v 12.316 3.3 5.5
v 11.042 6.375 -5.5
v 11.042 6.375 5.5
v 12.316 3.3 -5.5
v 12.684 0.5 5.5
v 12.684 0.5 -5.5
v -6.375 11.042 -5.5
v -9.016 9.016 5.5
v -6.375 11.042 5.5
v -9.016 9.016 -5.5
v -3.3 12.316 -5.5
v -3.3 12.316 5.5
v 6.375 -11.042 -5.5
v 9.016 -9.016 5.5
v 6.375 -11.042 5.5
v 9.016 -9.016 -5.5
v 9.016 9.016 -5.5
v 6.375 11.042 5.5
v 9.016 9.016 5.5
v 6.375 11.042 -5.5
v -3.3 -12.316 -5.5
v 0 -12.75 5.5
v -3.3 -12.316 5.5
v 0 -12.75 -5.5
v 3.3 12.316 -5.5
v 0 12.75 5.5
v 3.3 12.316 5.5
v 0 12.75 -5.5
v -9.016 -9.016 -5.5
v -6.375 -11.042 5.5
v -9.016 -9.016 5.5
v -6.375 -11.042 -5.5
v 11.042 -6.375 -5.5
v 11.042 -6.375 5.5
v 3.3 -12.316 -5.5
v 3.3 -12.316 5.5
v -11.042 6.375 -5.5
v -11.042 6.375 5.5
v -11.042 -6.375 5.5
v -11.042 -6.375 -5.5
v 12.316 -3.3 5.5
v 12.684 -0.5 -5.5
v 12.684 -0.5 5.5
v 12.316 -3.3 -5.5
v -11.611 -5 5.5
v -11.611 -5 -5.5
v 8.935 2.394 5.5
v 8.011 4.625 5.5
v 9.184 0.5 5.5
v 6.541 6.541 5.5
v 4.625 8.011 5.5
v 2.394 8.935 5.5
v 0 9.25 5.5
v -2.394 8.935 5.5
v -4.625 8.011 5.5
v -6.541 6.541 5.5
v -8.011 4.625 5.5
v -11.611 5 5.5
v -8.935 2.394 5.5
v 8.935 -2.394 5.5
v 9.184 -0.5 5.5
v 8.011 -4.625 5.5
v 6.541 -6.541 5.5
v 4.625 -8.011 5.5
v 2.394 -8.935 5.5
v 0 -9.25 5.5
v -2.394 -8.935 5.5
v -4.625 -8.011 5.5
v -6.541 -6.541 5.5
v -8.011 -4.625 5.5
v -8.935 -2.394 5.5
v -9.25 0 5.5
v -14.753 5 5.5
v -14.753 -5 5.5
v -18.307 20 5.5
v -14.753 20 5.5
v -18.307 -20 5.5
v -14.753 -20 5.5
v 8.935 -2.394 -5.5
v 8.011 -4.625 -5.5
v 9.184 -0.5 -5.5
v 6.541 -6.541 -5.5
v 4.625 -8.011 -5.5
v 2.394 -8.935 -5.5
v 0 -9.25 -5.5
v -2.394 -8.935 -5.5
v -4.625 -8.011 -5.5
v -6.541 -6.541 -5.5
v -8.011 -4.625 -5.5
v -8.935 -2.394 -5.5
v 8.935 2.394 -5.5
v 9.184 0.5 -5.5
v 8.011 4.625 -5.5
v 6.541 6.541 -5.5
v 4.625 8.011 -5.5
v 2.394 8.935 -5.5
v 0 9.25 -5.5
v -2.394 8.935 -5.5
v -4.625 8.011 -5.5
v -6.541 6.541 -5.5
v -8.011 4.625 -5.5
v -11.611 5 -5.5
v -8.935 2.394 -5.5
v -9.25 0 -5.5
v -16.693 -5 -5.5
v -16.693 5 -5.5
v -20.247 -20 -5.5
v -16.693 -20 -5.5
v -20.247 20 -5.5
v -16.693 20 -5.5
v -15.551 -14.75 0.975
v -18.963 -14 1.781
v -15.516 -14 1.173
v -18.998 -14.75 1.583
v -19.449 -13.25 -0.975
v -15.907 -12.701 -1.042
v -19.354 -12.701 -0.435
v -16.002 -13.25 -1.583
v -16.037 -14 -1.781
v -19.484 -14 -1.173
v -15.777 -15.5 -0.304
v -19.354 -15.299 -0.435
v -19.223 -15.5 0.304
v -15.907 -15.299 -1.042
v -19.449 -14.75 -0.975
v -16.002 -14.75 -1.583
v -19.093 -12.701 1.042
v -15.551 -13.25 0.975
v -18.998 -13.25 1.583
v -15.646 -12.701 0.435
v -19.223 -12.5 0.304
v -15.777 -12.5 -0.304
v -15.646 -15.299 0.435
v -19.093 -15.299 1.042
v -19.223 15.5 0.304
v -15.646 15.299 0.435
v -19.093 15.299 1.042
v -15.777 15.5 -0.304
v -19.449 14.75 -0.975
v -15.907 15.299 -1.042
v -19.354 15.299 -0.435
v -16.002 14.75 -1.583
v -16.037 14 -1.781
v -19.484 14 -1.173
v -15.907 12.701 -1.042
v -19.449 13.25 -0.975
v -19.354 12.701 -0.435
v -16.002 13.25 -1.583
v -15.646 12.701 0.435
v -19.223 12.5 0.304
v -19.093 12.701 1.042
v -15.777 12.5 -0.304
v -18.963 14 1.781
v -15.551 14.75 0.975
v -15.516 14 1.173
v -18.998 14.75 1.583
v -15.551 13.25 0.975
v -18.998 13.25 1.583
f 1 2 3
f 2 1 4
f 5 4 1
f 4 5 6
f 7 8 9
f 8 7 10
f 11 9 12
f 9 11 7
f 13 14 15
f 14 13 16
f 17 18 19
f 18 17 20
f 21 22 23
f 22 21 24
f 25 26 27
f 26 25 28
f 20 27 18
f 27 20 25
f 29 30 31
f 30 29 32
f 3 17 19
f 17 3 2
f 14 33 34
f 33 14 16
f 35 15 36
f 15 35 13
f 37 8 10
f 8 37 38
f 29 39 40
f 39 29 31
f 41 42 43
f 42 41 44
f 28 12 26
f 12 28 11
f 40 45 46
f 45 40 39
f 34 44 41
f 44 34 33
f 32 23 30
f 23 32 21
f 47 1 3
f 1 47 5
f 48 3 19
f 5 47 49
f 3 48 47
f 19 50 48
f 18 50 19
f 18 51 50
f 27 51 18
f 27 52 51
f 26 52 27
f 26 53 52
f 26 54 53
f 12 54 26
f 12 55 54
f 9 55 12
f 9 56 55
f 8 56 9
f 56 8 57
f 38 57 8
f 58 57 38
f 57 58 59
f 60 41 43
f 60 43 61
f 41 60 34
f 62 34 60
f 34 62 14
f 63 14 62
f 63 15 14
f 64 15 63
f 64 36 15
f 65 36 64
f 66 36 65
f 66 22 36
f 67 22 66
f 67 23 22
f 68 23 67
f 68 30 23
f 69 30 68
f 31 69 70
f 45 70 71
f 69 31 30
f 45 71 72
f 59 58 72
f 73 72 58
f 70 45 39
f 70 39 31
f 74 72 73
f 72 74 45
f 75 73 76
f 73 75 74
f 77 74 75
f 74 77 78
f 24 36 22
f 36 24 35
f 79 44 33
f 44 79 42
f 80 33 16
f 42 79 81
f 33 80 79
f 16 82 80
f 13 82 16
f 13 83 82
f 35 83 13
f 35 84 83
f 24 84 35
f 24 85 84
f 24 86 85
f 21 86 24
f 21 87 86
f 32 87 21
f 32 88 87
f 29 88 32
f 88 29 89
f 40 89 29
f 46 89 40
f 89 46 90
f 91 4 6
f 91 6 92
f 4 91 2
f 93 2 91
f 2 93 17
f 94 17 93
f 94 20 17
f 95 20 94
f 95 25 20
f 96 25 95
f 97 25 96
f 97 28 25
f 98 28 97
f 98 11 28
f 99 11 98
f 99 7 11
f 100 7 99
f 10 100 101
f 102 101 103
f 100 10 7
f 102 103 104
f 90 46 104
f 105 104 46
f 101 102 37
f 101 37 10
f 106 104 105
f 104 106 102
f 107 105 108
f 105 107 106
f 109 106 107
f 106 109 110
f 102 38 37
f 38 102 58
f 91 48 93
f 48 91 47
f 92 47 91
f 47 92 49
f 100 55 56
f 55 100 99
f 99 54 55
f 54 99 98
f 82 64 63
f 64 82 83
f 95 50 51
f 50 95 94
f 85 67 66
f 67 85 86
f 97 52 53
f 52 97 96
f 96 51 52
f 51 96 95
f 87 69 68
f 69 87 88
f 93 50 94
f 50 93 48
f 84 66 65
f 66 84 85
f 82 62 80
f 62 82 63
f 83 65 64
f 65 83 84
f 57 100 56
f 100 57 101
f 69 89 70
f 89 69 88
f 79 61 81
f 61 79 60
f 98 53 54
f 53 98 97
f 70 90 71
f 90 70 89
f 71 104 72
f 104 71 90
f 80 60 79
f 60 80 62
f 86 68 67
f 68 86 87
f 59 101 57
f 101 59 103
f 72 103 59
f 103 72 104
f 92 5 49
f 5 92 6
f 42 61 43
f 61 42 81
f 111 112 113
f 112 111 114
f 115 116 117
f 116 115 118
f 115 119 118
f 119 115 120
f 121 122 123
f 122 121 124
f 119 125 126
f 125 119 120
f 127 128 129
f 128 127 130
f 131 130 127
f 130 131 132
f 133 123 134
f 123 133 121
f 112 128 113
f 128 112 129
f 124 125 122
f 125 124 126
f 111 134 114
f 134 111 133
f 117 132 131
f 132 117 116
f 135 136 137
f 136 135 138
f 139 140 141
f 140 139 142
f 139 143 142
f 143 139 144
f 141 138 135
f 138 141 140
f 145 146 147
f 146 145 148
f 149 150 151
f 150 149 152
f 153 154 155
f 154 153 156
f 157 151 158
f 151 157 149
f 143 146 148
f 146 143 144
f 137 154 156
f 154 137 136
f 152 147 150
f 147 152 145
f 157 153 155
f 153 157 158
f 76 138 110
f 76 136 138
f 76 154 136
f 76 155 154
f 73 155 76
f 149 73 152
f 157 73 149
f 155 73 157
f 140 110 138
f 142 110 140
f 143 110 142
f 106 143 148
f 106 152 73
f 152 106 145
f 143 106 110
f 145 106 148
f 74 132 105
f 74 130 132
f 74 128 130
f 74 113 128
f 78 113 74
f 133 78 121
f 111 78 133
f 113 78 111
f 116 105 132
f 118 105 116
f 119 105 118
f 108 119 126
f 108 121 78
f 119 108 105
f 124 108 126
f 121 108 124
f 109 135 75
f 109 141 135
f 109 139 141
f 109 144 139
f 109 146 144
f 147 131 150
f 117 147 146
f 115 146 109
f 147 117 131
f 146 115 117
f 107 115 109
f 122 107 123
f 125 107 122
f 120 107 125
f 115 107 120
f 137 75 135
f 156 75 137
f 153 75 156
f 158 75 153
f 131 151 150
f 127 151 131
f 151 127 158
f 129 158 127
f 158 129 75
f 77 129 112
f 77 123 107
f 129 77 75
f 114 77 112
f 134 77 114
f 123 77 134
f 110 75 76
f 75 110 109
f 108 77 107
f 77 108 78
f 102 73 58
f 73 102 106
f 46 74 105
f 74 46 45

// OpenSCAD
intersection()
{
    cube(size=[100, 100, 11], center=true);
    
    union()
    {
        difference()
        {
            difference()
            {
                cylinder(h=11, d1=18.5+7, d2=18.5+7, $fn=24, center=true);
                cylinder(h=12, d1=18.5, d2=18.5, $fn=24, center=true);
            }
            // cut
            translate([10, 0, 0]) cube(size=[20, 1, 22], center=true);
        }
        translate([-14, 0, 0]) cube(size=[8, 10, 11], center=true);

        // plate with holes
        translate([-17.5, 0, 0])
        rotate(a=10, v=[0, 1, 0])
        difference()
        {
            cube(size=[3.5, 40, 12], center=true);
            // holes
            rotate(a=90, v=[0,1,0])
            union()
            {
                translate([0,-14,0]) cylinder(h=5, d1=3, d2=3, $fn=12, center=true);
                translate([0, 14,0]) cylinder(h=5, d1=3, d2=3, $fn=12, center=true);
            }
        }
    }
}
